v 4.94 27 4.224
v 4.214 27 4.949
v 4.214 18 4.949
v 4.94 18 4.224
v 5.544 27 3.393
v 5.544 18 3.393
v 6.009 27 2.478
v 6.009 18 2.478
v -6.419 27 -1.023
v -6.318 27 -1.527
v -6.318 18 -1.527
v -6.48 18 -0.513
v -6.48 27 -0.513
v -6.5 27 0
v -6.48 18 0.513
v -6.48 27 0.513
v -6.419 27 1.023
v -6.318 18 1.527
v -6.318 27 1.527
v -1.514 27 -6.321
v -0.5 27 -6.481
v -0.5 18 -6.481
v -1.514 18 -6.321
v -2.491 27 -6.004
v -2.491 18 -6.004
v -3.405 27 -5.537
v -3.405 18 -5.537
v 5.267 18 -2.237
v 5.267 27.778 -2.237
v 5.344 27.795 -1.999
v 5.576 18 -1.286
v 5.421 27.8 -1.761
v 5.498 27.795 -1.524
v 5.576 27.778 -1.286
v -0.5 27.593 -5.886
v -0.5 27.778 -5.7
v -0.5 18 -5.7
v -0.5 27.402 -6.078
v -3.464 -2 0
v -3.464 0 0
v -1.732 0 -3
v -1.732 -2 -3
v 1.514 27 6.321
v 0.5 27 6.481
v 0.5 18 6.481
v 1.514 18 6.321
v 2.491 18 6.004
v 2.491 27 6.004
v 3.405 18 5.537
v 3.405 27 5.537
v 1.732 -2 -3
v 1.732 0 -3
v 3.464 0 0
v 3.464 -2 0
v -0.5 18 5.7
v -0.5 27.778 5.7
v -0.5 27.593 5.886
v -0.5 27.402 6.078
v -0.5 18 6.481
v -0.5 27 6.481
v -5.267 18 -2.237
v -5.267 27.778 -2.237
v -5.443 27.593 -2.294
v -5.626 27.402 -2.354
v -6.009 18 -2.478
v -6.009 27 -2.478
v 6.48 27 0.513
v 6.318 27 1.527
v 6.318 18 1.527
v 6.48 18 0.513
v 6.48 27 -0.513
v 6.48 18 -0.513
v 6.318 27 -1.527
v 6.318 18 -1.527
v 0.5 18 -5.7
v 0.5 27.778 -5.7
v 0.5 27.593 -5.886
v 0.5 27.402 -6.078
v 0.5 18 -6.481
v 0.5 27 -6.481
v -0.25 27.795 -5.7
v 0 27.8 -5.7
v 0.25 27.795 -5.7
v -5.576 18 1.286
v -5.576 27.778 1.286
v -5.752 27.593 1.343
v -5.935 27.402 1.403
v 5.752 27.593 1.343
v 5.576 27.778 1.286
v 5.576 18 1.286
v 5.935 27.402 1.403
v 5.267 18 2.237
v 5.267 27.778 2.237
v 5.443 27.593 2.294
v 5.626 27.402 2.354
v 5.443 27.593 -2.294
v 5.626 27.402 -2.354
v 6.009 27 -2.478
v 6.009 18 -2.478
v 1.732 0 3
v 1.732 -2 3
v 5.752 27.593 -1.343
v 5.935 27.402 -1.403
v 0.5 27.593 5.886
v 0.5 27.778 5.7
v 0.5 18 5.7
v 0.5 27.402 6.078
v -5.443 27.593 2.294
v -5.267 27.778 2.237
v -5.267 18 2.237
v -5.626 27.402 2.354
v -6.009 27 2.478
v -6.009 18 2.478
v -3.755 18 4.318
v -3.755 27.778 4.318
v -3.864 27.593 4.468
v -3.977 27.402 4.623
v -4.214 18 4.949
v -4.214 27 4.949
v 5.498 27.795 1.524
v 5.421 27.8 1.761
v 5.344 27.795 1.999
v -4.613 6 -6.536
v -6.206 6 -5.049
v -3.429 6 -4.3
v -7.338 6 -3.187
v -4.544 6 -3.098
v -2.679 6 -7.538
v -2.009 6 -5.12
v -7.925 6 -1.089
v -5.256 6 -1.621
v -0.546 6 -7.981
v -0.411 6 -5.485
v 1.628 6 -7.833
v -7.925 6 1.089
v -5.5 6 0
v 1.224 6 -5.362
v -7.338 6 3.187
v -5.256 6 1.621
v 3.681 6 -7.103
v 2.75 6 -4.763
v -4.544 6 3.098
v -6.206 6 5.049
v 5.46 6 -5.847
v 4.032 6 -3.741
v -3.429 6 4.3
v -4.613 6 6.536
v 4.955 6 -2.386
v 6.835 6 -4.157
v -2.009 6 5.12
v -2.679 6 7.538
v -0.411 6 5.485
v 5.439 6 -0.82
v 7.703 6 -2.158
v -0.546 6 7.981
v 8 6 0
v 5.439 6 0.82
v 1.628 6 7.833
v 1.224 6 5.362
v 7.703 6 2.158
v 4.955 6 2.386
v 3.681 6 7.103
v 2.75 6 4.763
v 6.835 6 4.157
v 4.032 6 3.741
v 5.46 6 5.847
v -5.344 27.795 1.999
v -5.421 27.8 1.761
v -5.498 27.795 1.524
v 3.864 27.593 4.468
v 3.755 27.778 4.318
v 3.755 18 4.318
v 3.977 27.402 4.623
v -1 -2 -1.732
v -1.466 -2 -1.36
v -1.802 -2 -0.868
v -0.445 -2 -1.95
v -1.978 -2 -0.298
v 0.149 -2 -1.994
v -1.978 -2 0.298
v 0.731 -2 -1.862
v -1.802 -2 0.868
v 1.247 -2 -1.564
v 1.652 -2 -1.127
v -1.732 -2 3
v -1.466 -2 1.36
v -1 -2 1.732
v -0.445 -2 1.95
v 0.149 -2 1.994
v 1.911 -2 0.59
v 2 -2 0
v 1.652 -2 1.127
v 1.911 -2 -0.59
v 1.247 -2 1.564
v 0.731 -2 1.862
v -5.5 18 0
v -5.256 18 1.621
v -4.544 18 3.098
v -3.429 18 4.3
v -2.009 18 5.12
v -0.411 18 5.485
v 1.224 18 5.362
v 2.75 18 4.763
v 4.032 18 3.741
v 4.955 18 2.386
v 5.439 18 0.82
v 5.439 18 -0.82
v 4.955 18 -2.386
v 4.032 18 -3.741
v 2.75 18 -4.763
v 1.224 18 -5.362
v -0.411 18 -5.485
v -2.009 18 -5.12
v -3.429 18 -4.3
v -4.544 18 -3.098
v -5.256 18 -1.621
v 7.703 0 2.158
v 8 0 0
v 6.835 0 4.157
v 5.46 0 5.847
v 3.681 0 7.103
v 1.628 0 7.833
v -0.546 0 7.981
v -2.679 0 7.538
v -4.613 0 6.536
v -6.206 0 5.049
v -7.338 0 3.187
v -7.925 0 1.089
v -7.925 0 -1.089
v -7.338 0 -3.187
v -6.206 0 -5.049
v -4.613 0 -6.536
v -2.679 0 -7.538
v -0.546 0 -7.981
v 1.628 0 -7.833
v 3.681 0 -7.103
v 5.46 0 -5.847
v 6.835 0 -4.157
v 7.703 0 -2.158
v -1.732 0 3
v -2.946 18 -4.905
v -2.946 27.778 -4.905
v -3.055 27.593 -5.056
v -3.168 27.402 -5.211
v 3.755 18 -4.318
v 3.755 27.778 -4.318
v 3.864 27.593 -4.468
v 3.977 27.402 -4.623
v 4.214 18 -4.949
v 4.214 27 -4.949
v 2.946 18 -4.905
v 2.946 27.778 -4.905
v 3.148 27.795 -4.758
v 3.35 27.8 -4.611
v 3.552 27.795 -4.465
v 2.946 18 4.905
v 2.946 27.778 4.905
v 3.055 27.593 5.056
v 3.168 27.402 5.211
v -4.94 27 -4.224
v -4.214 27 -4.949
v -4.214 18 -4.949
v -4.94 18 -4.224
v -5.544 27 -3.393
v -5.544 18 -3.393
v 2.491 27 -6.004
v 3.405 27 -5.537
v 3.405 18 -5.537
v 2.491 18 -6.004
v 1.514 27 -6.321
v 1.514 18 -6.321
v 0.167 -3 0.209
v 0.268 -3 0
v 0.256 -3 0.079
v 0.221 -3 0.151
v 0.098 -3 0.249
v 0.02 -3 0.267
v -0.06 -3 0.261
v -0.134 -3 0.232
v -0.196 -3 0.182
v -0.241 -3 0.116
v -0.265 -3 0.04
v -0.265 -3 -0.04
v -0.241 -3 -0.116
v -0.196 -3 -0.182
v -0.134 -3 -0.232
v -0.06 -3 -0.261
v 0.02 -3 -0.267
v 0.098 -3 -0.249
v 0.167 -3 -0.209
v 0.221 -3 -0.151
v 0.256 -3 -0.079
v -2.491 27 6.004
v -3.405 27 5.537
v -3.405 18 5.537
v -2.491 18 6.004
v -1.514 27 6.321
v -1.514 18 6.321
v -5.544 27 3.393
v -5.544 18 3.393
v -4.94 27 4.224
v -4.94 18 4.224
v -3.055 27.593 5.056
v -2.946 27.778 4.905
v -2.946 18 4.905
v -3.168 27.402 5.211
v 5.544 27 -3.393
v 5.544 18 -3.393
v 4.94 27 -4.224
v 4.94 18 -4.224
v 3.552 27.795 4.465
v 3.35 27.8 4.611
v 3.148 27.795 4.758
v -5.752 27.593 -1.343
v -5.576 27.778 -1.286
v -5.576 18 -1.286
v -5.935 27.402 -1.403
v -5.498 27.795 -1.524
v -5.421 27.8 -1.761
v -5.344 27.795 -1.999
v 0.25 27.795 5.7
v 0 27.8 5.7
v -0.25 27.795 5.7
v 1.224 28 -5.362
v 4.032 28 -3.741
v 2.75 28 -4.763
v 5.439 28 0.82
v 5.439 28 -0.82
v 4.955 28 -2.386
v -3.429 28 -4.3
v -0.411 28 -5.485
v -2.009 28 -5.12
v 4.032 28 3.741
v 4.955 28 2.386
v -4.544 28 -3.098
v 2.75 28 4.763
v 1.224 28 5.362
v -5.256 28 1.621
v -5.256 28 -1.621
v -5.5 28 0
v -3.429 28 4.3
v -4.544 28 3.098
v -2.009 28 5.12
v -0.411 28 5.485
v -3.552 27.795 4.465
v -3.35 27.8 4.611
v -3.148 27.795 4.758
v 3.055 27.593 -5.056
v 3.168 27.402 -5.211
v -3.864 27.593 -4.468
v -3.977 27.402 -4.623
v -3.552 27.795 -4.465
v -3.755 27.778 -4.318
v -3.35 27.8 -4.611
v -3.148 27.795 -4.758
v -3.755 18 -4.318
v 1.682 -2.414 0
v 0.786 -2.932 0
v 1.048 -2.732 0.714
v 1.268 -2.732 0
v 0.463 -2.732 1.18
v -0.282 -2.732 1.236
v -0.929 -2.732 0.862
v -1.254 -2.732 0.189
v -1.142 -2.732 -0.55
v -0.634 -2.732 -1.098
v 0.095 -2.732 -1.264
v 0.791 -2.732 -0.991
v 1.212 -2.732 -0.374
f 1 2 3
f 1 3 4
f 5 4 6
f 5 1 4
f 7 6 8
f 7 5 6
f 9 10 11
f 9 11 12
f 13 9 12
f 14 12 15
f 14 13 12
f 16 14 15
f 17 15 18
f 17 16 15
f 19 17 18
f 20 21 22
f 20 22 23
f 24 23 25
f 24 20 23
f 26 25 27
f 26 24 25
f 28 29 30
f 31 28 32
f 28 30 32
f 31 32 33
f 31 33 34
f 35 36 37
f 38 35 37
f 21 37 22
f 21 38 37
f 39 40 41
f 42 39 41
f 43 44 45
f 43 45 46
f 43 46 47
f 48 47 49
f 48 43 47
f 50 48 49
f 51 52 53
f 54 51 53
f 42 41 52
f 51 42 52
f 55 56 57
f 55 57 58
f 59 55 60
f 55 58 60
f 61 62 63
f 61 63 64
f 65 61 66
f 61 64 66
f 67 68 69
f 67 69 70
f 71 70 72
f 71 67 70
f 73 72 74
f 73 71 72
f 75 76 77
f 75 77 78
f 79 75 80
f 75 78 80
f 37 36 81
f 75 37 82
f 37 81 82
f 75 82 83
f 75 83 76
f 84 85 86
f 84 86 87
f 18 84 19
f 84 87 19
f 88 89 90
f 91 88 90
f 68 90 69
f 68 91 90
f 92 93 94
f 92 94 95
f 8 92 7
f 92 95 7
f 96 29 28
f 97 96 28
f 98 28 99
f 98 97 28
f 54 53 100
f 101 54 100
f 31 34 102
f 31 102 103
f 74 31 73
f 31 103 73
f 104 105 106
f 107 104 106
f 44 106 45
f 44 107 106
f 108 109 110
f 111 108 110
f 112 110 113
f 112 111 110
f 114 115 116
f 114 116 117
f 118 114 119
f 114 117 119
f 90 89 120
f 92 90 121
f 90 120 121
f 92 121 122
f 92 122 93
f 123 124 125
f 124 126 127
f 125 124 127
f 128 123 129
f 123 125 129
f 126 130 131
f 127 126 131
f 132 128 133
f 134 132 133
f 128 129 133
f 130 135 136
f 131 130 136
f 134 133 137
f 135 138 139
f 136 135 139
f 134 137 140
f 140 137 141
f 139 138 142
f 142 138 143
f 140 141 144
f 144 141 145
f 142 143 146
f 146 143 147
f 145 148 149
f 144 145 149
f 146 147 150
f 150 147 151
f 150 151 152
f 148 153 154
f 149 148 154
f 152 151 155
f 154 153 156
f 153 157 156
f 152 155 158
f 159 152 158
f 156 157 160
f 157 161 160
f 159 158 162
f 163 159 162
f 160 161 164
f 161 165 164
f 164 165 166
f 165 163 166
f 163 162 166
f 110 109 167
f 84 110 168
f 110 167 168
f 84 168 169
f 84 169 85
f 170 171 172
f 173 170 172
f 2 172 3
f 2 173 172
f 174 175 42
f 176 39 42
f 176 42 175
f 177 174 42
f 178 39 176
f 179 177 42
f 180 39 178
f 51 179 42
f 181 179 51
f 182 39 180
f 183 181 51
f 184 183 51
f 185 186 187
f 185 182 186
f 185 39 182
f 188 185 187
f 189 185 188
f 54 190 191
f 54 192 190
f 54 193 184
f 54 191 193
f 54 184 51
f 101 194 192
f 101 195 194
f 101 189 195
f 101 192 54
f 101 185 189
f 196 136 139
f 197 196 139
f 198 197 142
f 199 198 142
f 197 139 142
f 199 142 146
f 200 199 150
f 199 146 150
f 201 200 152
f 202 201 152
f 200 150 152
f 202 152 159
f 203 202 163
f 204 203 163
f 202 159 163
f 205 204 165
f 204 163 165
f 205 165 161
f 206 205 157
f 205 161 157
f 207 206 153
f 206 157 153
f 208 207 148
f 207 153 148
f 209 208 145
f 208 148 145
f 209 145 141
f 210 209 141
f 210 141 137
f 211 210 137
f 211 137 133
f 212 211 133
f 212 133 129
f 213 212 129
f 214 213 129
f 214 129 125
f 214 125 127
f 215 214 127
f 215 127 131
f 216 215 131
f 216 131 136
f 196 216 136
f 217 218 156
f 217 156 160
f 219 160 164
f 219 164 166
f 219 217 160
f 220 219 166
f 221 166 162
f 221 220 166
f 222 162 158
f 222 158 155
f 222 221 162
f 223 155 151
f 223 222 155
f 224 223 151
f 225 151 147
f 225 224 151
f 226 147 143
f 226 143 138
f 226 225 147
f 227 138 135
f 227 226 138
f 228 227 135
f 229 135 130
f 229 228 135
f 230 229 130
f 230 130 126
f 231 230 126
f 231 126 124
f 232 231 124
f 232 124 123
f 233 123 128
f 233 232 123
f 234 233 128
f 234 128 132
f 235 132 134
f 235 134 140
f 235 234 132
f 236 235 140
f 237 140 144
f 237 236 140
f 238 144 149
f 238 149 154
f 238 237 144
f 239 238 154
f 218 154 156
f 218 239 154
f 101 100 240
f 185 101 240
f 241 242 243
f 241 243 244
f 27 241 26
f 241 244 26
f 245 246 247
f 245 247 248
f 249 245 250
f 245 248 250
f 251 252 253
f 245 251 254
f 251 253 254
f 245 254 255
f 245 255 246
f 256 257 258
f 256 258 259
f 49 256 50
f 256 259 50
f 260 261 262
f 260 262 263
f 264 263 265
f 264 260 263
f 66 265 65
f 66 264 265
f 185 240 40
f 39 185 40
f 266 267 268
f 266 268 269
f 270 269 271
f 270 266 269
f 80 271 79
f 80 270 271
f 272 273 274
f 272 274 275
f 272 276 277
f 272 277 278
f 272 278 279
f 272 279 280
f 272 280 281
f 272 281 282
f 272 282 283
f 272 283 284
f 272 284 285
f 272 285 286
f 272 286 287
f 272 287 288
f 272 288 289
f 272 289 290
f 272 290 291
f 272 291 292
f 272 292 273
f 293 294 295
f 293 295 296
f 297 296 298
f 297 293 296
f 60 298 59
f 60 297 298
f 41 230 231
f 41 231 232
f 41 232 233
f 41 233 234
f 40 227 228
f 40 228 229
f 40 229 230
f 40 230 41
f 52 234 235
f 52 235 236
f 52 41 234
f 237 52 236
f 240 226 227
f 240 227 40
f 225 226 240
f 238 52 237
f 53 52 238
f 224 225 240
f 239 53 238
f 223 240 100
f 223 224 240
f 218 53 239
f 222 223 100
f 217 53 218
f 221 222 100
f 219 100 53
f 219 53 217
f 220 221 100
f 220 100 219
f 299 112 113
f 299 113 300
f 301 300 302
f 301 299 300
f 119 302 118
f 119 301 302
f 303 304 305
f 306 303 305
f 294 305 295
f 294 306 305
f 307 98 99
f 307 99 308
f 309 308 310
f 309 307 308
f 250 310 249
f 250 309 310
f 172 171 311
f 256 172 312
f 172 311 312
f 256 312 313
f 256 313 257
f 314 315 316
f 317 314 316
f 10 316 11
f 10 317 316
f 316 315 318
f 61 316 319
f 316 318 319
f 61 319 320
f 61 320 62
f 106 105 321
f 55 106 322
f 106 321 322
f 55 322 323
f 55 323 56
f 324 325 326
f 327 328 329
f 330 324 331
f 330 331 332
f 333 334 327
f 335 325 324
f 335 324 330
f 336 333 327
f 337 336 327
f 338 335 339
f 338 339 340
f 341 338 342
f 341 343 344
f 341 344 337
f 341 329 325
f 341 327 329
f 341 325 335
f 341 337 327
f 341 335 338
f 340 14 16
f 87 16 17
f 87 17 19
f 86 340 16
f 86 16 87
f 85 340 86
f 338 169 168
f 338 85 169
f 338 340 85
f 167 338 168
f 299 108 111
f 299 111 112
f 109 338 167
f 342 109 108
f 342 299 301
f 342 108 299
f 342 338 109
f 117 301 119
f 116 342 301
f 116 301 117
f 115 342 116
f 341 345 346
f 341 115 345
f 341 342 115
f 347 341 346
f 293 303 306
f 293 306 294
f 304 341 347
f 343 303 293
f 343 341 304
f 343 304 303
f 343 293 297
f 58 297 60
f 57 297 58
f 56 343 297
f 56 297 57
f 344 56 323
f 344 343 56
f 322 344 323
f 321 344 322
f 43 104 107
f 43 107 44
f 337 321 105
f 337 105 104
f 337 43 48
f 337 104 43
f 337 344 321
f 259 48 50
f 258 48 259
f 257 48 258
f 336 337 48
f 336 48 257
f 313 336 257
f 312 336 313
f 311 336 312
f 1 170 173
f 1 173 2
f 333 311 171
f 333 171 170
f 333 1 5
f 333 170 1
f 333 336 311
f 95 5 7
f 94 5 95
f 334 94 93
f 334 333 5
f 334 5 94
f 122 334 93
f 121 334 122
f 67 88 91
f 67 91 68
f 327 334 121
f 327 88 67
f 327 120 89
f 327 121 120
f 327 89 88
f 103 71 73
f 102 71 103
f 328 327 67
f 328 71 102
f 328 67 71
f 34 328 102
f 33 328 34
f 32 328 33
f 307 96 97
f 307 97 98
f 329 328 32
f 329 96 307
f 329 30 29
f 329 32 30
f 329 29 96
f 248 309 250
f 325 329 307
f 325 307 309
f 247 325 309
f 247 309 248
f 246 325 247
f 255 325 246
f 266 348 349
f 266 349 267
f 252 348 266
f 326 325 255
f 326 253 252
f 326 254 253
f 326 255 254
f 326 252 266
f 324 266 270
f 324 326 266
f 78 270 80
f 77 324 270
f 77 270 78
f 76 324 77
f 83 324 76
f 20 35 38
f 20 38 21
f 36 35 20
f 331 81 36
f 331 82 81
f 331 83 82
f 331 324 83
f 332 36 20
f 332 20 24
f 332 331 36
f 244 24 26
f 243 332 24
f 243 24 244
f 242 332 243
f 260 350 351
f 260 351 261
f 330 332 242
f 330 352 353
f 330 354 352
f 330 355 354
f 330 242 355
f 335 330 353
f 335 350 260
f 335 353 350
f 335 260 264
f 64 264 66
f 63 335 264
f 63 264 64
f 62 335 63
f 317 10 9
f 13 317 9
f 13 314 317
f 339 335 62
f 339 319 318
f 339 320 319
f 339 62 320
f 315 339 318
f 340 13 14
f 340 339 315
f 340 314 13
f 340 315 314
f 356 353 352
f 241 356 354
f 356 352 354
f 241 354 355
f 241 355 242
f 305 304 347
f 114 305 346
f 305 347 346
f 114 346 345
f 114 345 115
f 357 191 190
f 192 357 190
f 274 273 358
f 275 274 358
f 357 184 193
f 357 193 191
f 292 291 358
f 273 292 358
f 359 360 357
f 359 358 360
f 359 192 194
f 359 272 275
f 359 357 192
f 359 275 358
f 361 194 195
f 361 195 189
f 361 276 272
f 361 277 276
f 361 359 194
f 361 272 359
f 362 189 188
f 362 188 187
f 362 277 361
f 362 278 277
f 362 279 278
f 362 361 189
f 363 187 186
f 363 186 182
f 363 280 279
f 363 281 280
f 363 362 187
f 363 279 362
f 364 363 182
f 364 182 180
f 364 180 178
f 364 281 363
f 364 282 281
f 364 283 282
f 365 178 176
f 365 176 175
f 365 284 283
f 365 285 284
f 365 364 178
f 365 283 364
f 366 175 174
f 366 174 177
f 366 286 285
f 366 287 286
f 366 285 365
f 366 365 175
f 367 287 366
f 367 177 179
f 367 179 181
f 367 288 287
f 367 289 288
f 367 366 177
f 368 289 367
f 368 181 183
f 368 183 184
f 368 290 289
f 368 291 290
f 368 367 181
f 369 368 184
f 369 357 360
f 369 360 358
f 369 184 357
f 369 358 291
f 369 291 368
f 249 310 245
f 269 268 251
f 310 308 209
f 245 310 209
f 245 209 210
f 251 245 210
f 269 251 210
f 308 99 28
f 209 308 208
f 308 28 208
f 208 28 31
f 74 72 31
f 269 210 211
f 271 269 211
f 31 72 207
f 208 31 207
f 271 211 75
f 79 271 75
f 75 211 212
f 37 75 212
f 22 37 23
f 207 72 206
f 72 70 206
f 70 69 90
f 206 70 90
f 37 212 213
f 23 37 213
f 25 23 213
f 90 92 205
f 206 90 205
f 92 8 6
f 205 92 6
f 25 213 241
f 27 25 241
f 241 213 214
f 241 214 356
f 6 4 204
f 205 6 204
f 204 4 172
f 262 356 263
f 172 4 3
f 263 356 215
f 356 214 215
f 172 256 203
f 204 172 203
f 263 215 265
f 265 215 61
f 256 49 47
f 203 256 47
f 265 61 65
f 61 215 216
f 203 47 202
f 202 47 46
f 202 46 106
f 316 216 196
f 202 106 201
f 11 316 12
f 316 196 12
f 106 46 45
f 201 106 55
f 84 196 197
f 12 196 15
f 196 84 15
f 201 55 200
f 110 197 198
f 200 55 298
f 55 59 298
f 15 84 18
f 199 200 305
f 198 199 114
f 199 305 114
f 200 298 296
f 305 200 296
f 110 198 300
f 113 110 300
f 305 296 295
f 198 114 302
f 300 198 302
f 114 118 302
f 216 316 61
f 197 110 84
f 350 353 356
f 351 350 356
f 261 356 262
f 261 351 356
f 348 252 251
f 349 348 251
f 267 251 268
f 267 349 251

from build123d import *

# Parameters (mm, degrees)
F0_R             = 8
F1_DEPTH         = 6
F3_DEPTH         = 2
F4_R             = 2
F5_DEPTH         = 1
F7_R             = 5.5
F8_DEPTH         = 22
F9_R             = 6.5
F9_R_2           = 5.5
F10_DEPTH        = 10
F11_SIZE         = 1
F12_W            = 1
F12_H            = 2
F13_DEPTH        = 20
F13_COPIES_COUNT = 10


# Not quite as in the source:
# - a fillet or chamfer that OpenCascade refuses, or shapes differently, is made with other operations: its cross-section is extruded or revolved along the edge and cut away or added
# - a pattern or mirror of a feature is missing from the dataset's text; its kind, count and spacing are read off the source's solid


with BuildPart() as f1:
    # F0 (on Front) → F1 (new body)
    with BuildSketch(Plane.XZ):
        Circle(F0_R)
    extrude(amount=-F1_DEPTH)

    # F2 (on face) → F3 (join)
    with BuildSketch(Plane.XZ):
        Polygon((1.7320508076, 3), (-1.7320508076, 3), (-3.4641016151, 0), (-1.7320508076, -3), (1.7320508076, -3), (3.4641016151, 0), align=None)
    extrude(amount=F3_DEPTH)

    # F4 (on face) → F5 (join)
    with BuildSketch(Plane.XZ.offset(2)):
        Circle(F4_R)
    extrude(amount=F5_DEPTH)

    # F6: fillet of radius 2 on 1 edges, made by hand

    # F6_s1 → F6_t2 (revolve, cut)
    with BuildSketch(Plane.XY):
        with BuildLine():
            ThreePointArc((2, -2), (1.2679491924, -2.7320508076), (0.2679491924, -3))
            Line((0.2679491924, -3), (2, -3))
            Line((2, -3), (2, -2))
        make_face()
    revolve(axis=Axis((0, -3, 0), (0, -1, 0)), mode=Mode.SUBTRACT)

    # F7 (on face) → F8 (join)
    with BuildSketch(Plane(origin=(0, 6, 0), x_dir=(-1, 0, 0), z_dir=(0, 1, 0))):
        Circle(F7_R)
    extrude(amount=F8_DEPTH)

    # F9 (on face) → F10 (join)
    with BuildSketch(Plane(origin=(0, 28, 0), x_dir=(-1, 0, 0), z_dir=(0, 1, 0))):
        Circle(F9_R)
        Circle(F9_R_2, mode=Mode.SUBTRACT)
    extrude(amount=-F10_DEPTH)

    # F11
    f11_edges = [f1.edges().sort_by_distance(p)[0] for p in [
        (6.5, 28, 0),
    ]]
    chamfer(f11_edges, length=F11_SIZE)

    # F12 (on face) → F13 (cut)
    with BuildSketch(Plane(origin=(0, 28, 0), x_dir=(-1, 0, 0), z_dir=(0, 1, 0))):
        with Locations((0, 6.7)):
            Rectangle(F12_W, F12_H)
    f13 = extrude(amount=-F13_DEPTH, mode=Mode.SUBTRACT)

    # F13_copies: F13 ×10 about axis
    f13_copies_axis = Axis((0, 0, 0), (0, 1, 0))
    for i in range(1, F13_COPIES_COUNT):
        add(f13.rotate(f13_copies_axis, i * 360 / F13_COPIES_COUNT), mode=Mode.SUBTRACT)


solid = f1.part
